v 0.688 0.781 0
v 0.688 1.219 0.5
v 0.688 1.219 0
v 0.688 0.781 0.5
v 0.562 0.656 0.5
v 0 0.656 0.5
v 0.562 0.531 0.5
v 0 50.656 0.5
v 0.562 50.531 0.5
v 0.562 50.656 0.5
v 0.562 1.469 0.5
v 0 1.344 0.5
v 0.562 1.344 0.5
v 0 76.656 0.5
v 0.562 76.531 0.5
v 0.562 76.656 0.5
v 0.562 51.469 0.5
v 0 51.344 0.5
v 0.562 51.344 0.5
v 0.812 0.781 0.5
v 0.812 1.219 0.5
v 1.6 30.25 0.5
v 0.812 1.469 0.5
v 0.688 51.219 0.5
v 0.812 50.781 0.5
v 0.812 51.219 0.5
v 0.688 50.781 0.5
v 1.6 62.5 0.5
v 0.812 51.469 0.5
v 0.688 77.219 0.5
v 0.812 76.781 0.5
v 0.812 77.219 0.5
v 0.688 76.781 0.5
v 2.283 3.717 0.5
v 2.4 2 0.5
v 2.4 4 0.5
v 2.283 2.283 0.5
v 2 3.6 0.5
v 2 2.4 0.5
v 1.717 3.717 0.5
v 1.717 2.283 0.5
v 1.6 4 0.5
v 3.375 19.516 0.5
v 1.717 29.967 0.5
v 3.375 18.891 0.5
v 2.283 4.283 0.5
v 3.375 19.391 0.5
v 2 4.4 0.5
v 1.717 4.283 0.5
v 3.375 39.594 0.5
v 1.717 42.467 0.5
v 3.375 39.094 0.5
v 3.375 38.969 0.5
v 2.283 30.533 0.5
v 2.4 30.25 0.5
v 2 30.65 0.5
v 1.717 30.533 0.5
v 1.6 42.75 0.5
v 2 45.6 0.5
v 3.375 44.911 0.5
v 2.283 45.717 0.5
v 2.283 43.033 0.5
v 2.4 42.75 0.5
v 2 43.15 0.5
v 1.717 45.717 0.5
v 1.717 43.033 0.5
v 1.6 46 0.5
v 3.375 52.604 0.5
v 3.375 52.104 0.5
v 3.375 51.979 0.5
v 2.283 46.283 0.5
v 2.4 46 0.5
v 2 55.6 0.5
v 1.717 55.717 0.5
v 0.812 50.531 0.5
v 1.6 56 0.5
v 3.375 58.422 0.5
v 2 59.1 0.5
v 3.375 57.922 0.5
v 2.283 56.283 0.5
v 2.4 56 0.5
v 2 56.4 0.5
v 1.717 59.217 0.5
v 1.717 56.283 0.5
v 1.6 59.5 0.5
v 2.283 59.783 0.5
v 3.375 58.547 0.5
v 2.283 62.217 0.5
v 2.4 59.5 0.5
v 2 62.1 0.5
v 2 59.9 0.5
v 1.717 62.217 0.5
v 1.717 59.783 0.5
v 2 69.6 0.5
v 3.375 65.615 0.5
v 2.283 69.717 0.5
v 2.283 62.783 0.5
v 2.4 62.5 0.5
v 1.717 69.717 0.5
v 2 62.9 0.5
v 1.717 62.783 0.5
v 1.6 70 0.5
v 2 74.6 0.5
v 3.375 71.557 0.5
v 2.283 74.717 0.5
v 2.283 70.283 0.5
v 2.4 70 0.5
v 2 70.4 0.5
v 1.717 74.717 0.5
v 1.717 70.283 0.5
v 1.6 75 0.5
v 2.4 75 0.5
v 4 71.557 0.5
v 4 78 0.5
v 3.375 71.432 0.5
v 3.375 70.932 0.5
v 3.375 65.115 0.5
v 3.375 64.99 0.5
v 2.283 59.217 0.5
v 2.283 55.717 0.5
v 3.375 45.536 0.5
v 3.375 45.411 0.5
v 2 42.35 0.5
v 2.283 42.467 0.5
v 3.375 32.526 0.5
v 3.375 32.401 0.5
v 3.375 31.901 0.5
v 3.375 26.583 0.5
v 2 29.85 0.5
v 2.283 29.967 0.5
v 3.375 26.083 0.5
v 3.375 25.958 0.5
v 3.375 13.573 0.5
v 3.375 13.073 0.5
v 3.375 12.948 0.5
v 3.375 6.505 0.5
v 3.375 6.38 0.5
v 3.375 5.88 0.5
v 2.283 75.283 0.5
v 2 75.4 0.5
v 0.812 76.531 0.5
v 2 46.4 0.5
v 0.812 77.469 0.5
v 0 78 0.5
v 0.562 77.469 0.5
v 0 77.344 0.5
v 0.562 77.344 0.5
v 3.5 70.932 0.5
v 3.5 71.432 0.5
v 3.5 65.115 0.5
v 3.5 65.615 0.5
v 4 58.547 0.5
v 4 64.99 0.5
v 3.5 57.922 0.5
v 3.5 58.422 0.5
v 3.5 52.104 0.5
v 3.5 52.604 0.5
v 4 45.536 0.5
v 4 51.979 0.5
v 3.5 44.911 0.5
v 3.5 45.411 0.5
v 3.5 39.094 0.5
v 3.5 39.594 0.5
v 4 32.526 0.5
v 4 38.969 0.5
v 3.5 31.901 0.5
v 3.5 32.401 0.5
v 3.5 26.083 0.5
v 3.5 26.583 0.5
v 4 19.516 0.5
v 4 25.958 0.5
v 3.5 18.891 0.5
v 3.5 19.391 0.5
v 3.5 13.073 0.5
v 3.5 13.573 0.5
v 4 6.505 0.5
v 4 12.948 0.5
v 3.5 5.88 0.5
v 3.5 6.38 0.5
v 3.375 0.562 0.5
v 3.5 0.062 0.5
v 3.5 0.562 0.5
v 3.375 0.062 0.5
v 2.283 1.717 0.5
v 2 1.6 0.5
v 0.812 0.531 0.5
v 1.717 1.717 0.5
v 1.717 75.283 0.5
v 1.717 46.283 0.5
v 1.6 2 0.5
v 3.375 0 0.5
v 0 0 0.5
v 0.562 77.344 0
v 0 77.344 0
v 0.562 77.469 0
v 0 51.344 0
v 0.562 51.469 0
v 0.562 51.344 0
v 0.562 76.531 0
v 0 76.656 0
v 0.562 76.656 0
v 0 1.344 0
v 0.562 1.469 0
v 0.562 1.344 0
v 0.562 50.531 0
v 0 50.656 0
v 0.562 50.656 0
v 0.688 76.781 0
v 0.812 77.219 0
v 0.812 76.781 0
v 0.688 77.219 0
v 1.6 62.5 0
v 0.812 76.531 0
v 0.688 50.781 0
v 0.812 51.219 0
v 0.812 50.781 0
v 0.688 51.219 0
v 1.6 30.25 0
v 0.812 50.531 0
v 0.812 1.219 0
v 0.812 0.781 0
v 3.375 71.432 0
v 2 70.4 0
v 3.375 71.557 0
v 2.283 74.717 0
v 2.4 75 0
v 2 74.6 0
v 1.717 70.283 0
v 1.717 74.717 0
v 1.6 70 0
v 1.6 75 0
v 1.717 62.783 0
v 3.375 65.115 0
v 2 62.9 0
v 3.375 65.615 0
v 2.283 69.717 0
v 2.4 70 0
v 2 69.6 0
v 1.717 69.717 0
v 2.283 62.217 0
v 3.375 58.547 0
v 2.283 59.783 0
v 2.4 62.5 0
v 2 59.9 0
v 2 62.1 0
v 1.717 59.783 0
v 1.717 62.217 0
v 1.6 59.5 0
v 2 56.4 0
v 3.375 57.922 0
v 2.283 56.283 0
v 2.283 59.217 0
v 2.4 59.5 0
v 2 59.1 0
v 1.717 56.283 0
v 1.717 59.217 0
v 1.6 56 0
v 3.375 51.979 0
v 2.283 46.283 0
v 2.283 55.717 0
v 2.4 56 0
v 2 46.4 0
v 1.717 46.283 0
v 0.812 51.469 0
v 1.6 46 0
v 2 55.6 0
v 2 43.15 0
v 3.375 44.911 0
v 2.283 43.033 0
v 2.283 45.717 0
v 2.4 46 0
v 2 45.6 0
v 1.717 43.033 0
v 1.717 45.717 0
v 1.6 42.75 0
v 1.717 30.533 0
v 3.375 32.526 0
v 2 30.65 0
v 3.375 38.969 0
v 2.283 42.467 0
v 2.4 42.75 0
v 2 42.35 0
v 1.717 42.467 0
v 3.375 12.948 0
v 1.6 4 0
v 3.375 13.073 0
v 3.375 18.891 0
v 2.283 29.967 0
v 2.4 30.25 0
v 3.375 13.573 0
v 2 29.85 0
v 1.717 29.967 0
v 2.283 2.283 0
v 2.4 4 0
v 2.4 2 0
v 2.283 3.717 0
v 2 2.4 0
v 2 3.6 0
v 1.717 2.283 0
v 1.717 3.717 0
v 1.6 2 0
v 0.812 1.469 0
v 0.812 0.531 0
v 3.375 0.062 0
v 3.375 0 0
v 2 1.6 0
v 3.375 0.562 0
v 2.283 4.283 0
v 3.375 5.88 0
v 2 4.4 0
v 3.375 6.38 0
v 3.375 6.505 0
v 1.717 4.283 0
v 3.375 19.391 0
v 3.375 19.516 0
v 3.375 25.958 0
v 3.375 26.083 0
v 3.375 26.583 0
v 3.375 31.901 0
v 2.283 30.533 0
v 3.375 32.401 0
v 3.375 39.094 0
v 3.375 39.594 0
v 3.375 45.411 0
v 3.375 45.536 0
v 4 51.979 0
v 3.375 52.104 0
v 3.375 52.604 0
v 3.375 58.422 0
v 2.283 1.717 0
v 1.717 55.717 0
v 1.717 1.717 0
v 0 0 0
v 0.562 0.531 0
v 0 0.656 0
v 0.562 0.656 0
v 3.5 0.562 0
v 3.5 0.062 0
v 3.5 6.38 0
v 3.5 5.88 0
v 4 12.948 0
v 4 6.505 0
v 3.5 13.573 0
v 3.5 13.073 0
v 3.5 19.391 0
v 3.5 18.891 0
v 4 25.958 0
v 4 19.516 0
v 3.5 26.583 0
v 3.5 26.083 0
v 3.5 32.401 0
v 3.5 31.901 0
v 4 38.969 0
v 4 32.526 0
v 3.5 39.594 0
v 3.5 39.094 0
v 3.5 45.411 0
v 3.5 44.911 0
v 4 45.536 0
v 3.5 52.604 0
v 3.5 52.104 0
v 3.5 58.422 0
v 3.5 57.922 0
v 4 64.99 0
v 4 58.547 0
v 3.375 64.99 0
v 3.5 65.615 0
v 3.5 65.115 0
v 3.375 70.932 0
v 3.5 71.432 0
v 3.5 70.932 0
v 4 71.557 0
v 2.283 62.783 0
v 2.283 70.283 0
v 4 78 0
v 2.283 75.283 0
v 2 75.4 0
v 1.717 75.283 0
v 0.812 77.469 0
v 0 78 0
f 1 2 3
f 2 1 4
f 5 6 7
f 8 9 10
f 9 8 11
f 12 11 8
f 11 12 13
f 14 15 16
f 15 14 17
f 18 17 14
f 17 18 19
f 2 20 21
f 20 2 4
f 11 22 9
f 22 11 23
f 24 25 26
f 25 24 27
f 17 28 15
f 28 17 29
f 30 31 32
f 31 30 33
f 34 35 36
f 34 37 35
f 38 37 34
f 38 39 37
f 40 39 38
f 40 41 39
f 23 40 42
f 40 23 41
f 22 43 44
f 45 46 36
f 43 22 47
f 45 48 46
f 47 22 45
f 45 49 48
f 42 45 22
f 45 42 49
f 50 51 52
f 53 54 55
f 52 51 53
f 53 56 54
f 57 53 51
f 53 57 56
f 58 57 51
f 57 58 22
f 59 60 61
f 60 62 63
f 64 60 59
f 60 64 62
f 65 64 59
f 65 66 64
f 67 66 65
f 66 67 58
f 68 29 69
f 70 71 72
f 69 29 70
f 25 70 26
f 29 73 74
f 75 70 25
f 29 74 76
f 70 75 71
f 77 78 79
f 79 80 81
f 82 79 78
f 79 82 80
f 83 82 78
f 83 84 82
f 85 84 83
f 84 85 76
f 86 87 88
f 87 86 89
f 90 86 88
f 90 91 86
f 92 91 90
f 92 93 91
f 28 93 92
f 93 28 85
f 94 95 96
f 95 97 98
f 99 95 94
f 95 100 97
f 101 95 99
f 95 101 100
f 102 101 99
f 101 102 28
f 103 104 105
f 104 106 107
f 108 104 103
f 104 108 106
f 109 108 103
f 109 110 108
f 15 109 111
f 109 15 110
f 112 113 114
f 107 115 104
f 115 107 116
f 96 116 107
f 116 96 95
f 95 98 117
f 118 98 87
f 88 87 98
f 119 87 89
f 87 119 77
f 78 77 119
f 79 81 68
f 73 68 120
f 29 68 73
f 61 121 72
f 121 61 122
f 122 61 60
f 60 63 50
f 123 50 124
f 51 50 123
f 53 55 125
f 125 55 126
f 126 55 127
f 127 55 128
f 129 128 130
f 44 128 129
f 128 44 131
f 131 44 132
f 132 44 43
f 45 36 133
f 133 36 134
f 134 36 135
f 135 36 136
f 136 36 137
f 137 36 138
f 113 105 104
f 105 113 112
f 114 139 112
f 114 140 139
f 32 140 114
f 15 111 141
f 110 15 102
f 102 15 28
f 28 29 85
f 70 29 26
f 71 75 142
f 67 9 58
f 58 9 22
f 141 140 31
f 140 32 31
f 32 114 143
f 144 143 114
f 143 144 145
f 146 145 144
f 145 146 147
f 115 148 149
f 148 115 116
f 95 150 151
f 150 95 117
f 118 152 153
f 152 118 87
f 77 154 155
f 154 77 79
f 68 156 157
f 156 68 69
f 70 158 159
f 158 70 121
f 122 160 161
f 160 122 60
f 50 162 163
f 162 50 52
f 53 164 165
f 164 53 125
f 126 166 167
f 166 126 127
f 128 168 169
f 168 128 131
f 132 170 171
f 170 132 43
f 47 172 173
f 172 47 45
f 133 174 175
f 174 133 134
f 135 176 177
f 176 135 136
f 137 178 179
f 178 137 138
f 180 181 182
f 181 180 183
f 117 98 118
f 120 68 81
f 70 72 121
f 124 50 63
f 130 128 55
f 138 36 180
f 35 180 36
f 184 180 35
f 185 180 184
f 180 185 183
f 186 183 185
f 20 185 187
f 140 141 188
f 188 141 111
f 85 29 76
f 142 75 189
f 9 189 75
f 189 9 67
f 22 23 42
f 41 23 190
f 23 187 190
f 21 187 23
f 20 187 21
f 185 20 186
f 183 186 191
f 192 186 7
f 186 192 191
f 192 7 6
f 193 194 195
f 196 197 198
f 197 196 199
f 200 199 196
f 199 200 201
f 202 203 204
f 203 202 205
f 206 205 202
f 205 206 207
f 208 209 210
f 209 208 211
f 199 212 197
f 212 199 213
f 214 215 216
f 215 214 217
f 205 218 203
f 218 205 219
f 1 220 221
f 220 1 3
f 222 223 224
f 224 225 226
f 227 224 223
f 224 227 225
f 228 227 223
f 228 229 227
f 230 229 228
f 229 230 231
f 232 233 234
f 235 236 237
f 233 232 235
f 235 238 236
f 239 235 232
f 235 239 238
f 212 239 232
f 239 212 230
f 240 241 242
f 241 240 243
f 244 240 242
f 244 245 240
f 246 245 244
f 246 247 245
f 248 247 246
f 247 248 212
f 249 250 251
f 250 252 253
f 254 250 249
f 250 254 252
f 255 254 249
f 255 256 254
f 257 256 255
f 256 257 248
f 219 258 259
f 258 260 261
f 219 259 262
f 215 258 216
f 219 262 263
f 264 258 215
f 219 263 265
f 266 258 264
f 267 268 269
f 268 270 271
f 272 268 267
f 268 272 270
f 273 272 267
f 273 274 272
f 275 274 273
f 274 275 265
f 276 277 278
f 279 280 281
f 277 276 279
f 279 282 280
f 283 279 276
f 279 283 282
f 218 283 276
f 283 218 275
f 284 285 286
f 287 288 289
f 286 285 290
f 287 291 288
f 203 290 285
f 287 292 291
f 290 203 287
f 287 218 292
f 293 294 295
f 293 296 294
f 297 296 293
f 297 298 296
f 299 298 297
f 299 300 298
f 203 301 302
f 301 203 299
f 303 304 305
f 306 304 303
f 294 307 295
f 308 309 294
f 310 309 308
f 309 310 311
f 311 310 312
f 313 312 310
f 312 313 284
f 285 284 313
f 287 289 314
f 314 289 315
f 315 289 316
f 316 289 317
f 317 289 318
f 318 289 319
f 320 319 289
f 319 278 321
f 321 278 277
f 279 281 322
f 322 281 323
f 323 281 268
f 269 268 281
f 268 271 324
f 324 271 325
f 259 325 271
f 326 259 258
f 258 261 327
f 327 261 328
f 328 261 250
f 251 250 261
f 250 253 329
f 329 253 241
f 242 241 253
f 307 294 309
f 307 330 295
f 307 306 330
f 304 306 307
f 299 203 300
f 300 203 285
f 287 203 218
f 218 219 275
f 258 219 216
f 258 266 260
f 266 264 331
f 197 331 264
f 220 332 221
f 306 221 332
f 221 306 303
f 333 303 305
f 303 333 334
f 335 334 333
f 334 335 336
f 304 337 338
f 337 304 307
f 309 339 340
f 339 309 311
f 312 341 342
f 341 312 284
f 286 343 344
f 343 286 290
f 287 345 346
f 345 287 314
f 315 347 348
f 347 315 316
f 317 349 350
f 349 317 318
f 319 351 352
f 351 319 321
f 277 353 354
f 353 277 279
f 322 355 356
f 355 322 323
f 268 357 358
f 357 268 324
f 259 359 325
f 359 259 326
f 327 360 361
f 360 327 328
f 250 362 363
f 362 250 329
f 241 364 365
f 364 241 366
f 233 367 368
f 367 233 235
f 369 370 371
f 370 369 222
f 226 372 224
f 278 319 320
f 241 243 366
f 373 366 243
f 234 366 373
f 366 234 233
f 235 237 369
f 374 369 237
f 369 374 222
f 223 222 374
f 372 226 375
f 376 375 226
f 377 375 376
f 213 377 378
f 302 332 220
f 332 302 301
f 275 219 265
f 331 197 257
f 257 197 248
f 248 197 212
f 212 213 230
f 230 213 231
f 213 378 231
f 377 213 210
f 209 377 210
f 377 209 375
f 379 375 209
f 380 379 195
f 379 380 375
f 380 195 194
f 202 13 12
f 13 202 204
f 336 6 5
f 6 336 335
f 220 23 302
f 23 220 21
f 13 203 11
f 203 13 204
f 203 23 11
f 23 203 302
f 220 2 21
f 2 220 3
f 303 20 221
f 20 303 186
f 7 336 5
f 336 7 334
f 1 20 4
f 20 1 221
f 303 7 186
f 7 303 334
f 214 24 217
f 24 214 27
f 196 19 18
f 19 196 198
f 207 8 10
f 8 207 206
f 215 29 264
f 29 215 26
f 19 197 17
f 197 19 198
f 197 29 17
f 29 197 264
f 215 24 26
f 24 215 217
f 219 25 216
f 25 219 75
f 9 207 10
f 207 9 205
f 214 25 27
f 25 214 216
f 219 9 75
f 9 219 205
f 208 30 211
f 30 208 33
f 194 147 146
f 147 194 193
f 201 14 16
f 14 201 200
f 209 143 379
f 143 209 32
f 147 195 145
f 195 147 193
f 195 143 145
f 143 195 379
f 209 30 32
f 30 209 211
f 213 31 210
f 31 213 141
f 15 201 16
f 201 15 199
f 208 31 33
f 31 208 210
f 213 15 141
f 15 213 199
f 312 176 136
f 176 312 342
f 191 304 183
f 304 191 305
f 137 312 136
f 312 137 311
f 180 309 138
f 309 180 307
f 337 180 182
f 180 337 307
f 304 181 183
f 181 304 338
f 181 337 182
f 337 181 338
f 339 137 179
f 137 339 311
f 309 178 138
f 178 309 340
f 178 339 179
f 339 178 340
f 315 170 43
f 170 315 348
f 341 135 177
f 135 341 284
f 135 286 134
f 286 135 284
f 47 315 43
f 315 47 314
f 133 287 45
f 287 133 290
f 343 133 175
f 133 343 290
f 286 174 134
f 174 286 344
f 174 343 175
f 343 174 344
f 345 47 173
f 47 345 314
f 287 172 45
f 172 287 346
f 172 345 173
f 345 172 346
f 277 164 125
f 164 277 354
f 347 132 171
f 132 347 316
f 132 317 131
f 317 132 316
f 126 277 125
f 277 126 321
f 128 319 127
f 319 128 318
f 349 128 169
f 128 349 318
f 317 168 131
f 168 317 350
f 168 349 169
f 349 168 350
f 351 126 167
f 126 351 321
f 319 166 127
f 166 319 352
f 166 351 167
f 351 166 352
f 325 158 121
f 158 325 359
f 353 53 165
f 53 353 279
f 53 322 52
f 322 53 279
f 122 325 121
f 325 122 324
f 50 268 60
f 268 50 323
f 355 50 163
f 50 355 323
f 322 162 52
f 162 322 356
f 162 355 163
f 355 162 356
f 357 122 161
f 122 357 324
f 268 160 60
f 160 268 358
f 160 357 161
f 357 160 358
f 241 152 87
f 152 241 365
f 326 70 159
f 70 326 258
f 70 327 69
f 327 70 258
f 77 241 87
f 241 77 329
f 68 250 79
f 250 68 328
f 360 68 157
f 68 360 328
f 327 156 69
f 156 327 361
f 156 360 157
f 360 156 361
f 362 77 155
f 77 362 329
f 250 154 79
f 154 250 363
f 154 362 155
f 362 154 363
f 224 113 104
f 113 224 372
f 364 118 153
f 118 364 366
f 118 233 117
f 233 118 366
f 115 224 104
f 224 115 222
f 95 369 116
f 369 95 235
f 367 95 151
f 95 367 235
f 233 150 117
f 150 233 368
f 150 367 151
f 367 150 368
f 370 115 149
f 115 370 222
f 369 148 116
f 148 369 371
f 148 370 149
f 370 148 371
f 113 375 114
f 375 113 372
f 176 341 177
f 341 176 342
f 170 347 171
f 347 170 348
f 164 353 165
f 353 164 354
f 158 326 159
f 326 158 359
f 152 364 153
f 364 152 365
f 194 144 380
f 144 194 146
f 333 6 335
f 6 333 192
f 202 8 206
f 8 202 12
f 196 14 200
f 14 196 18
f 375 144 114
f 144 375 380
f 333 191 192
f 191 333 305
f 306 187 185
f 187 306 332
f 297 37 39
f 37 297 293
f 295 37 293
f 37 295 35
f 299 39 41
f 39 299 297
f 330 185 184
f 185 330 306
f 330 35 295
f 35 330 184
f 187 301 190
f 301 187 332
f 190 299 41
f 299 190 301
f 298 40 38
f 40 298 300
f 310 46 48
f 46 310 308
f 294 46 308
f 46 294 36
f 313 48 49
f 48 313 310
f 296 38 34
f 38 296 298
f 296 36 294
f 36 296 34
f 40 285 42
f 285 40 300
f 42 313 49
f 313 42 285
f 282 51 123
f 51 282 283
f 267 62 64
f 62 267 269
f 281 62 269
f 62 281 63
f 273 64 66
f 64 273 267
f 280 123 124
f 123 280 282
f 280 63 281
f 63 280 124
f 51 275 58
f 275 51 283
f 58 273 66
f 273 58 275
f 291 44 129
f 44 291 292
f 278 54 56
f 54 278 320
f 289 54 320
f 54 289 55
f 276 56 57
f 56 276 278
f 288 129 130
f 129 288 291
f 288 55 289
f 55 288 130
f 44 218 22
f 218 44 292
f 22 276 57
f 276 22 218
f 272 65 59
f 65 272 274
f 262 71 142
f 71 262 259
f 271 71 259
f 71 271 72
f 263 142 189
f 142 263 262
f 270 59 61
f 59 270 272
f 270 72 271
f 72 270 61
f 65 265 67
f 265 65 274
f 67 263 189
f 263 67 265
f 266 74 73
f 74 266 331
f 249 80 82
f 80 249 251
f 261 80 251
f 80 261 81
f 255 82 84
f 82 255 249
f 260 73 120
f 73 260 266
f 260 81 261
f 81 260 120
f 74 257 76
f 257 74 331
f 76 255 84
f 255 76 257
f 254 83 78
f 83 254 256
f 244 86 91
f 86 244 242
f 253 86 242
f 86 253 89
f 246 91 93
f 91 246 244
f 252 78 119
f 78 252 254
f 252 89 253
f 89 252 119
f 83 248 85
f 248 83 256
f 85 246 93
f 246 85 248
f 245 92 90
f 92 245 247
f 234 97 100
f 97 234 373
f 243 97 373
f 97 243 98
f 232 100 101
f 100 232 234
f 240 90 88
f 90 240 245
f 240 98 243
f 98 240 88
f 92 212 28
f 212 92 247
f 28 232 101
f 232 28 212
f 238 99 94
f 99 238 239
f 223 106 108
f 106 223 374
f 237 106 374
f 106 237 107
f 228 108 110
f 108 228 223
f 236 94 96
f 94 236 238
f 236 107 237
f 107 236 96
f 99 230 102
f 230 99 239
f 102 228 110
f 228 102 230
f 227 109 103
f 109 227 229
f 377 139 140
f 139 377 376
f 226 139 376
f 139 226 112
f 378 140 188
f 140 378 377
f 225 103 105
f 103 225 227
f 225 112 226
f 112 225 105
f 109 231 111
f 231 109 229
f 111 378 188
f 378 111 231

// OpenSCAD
// file: modus.scad
//Corner Joint - allows the sides of two parts to create inlayed corner. Aids with welding.
//need to verify module math is the same throughout all parts.

module cornerjoint(Z,L,H,EndGap,PadL,PadH,CJangle,CJcenter){
    //change so that H = Z of inlayed part (usually 0.5)
    //add center and angle in degrees option, orgin far side of cut out area

     if((CJangle==0)&&(CJcenter==0))
      {    
        translate([0,0,0])
        rotate([0,0,CJangle])
        difference(){
        cube([L,H+PadH,Z]);
        translate([EndGap,H,0])
        cube([PadL,PadH,Z]);
        translate([L-EndGap-PadL,H,0])
        cube([PadL,PadH,Z]);}
      }    
else if((CJangle==90)&&(CJcenter==0))
      {    
        translate([H+PadH,0,0])
        rotate([0,0,CJangle])
        difference(){
        cube([L,H+PadH,Z]);
        translate([EndGap,H,0])
        cube([PadL,PadH,Z]);
        translate([L-EndGap-PadL,H,0])
        cube([PadL,PadH,Z]);}
      }
else if((CJangle==180)&&(CJcenter==0))       
      {    
        translate([L,H+PadH,0])
        rotate([0,0,CJangle])
        difference(){
        cube([L,H+PadH,Z]);
        translate([EndGap,H,0])
        cube([PadL,PadH,Z]);
        translate([L-EndGap-PadL,H,0])
        cube([PadL,PadH,Z]);}
      }
else if((CJangle==270)&&(CJcenter==0))
      {    
        translate([0,L,0])
        rotate([0,0,CJangle])
        difference(){
        cube([L,H+PadH,Z]);
        translate([EndGap,H,0])
        cube([PadL,PadH,Z]);
        translate([L-EndGap-PadL,H,0])
        cube([PadL,PadH,Z]);}
      }  
      
//centered     
   
else if((CJangle==0)&&(CJcenter==1))
      {    
        translate([-L/2,0,0])
        rotate([0,0,CJangle])
        difference(){
        cube([L,H+PadH,Z]);
        translate([EndGap,H,0])
        cube([PadL,PadH,Z]);
        translate([L-EndGap-PadL,H,0])
        cube([PadL,PadH,Z]);}
      }  
else if((CJangle==90)&&(CJcenter==1))
      {    
        translate([0,-L/2,0])
        rotate([0,0,CJangle])
        difference(){
        cube([L,H+PadH,Z]);
        translate([EndGap,H,0])
        cube([PadL,PadH,Z]);
        translate([L-EndGap-PadL,H,0])
        cube([PadL,PadH,Z]);}
      }
else if((CJangle==180)&&(CJcenter==1))       
      {    
        translate([L/2,0,0])
        rotate([0,0,CJangle])
        difference(){
        cube([L,H+PadH,Z]);
        translate([EndGap,H,0])
        cube([PadL,PadH,Z]);
        translate([L-EndGap-PadL,H,0])
        cube([PadL,PadH,Z]);}
      }
else if((CJangle==270)&&(CJcenter==1))
      {    
        translate([0,L/2,0])
        rotate([0,0,CJangle])
        difference(){
        cube([L,H+PadH,Z]);
        translate([EndGap,H,0])
        cube([PadL,PadH,Z]);
        translate([L-EndGap-PadL,H,0])
        cube([PadL,PadH,Z]);}
      }
} //end cornerjoint module

//Tab Insert - used to cut a hole for an abutting part to insert into. Typically aids with welding the two parts.
module tabinsert(X,Y,Z,dGap,cGap,c1,c2,c3,c4,c5,c6,c7,c8,center){
    translate([-dGap-(center*(X/2)),-dGap-(center*(Y/2)),0]){
        //main cut
        cube([X+(dGap*2),Y+(dGap*2),Z]);
        //corner c1c2
        translate([-cGap,(Y+(dGap*2))-c1+cGap,0])
            {
        cube([c2,c1,Z]);}
       //corner c3c4
       translate([(X+(dGap*2))-c3+cGap,(Y+(dGap*2))-c4+cGap,0]){
           cube([c3,c4,Z]);
       }
       //corner c5c6
       translate([(X+(dGap*2))-c6+cGap,-cGap,0])
      {
          cube([c6,c5,Z]);
      }
       
       //corner c7c8 
       translate([-cGap,-cGap,0]){
           cube([c7,c8,Z]);
       }
    
    } //end center translate
} //end tabinsert module
 

module nut(flattoflat,nutheight){  //distance from one flat side to the other flat side "A/F"

//typical sizes found here:
//https://en.wikipedia.org/wiki/Nut_(hardware)

difference(){
    translate([0,0,nutheight/2])
cube(size = [10,10,nutheight], center = true);
    
for(i=[1:6]){
    rotate([0,0,i*60])
difference(){
    translate([-10,0,0])
    cube([20,20,nutheight]);
    translate([-10,0,0])
    cube([20,flattoflat/2,nutheight]);
}  //end difference
}  //end for
}  //end differeence
}  //end module
// file: vars.scad
brickW=6; 
brickL=24;
brickCH=6; //Is brick height being shortened by d1z??

//3.625 x 2.25 x 8
//6 x 12 x 6

grateX=56;
grateY=23;
grateH=37; //Height mounted above press's frame
grateA=17.5; //angle of grate

//grateX=56;
//grateY=23;
//grateH=37; //Height mounted above press's frame
//grateA=17.5; //angle of grate


$fn=8; //defines resolution of circles. 8 is okay for review. 100  or greater should be used for for final dxf export.

dZstandard=0.5; //thickness of steel to be cut for drawer parts
fZstandard=0.5;
aZstandard=0.5; //thickness of steel to be cut for arm parts
hZstandard=0.125;

fBOLTHOLEstandardD=1; //standard bolts used on frame
aBOLTHOLEstandardD=1;

sliderodholeOD=1.2; 
d1bushingOD=1.25;
d1bushingL=1.25;
d1shaftOD=1;
d1bolt1OD=1;
d1bolt2OD=0.75;
d1nut2AF=1.25;
d1nut2H=0.665;


dGap=0.03125; //gap between a hole cut's edge and the part sitting within the hole. //D3 appears to use 0.3125, is this in error?

//all parts set to standard thickness below
//off standard preferences can be defined below

//drawer
drawergap=0.0283;  //extra room for drawer to slide in the space between f1 and f4
drawerHgap=0.1884;  //total extra space from drawer sides to frame walls. sum of both sides.

d2clevispinaccessholeOD=3;

d1z=dZstandard;
d2z=dZstandard;
d3z=dZstandard;
d4z=dZstandard;
d5z=dZstandard;
d6z=dZstandard;
d5z=dZstandard;
d7z=dZstandard;
d8z=dZstandard;
d9z=dZstandard;

d11z=dZstandard;
d12z=dZstandard;


//frame

f1y=6;
f1z=fZstandard;


f2y=3.5;
f2z=fZstandard;

f3y=3.5;
f3z=fZstandard;

f4y=11;
f4z=fZstandard;

f5y=3.5;
f5z=fZstandard;

f6y=8;
f6z=fZstandard;

f8y=brickW;
f8z=fZstandard;
f8boltD=1;

f9y=4.5;

f9z=fZstandard;




f12z=fZstandard;   

f11x=1.25;
f11z=fZstandard;

f13z=fZstandard;

f14y=3.5;
f14z=fZstandard;

//arms

a1x=4;
a1z=aZstandard;
a1out=24; //length from frame to A5 edge for bricks to sit on as they exit

a2x=6;
a2z=aZstandard;

a3x=4;
a3y=72;
a3z=aZstandard;

a4x=6;
a4y=72;
a4z=aZstandard;

a5x=6;
a5y=72;
a5z=aZstandard;

a6z=aZstandard;

//guards

h1x=grateX;
h1y=grateH;  //might need to tweak for grate thickness

h1z=hZstandard;
h2z=hZstandard;
h3z=hZstandard;
h4z=hZstandard;
h5z=hZstandard;
h6z=hZstandard;
h7z=hZstandard;
h8z=hZstandard;

//
//Input your main cylinder's dimenions here
//
cylMainBore = 5;
cylMainStroke = 16;
cylMainExt = 43;
cylMainRet = 27;
cylMainA = (cylMainRet-cylMainStroke); //center to center minus stroke length
cylMainB = 0.25; // cylinder wall thickness
cylMainD = 2.5; //Rod OD
cylMainE = 5.75; //rear pin holder width
cylMainG = 4; //rod pin holder width
cylMainJ = 3.8; //distance from the end of the cylinder body to rod pin center
cylMainR = 1.52; //pin hole ID
cylMainS = 2.5; //pin holder OD

//
//Input your drawer cylinder's dimenions here
//
//
cylDrawerBore = 5;
cylDrawerStroke = 16;
cylDrawerExt = 43;
cylDrawerRet = 27;
cylDrawerA = (cylMainRet-cylMainStroke); //center to center minus stroke length
cylDrawerB = 0.25; // cylinder wall thickness
cylDrawerD = 2.5; //Rod OD
cylDrawerE = 5.75; //rear pin holder width
cylDrawerG = 4; //rod pin holder width
cylDrawerJ = 3.8; //distance from the end of the cylinder body to rod pin center
cylDrawerR = 1.52; //pin hole ID
cylDrawerS = 2.5; //pin holder OD

cylinderDRAWERbodyH=3; //measured when in position, largest length from top to bottom of cylinder
cylinderDRAWERminC2C=0; //drawer's hydraulic cylinder's distance from the center of one mounting hole to the center of the other when fully compressed.
cylinderDRAWERmaxC2C=0; ///drawer's hydraulic cylinder's distance from the center of one mounting hole to the center of the other when fully extended.
cylinderDRAWERrodclevisW=2.5; //width of cylinders' clevis on end of rod
cylinderDRAWERrodclevisID=1;
cylinderDRAWERrodclevisOD=2;
cylinderDRAWERrearclevisW=2.5; //width of mounting clevis cylinder body
cylinderDRAWERrearclevisID=1;
cylinderDRAWERrearclevisOD=2;
cylinderDRAWERrearclevisClearance=3; //usable space around rear clevis pin (in diameter). be aware of hyraulic fittings.

//the following variables are calculated in order of dependence on preceding variables

d3x=brickL+(d2z*2);
d3y=brickCH-d1z;
d4x=brickW+d3z+d3z;
d4y=brickCH-d1z;
d5x=brickL+(d2z*2);
d5y=brickW;
d6x=brickL+(d2z*2);
d6y=brickCH;
d7x=cylinderDRAWERrearclevisClearance;
d7y=a4z+d8z+cylinderDRAWERbodyH;
d9x=cylinderDRAWERbodyH+d6z; //should be based on clevis size?
d9y=cylinderDRAWERbodyH+d8z;
d8x=brickL+(d2z*2);
d8y=max(5,(d9x-d6z));   //need to review fundamentals, 5 minimun unless d9 gets larger than d8
d11x=1.5+(d1bolt1OD*2)+d1bushingOD;
d11y=max((0.5+d1bushingL),4);

d12x=d8x;
d12y=d11y+1;

f1x=((brickL+(d2z*2)+drawerHgap+(f9y*2)));
f3x=f1x;

d1x=(brickL+d2z+d2z);
//d1x=(((f1x/2)-(((brickL+(d2z*2)+drawerHgap)/2)-fZstandard-(sliderodholeOD/2)))+(d11x/2))*2;
d1y=((brickW+d3z+d3z)*3)+1;

d2x=d8y+d6z+brickW+d3z+d5y+d3z;
d2y=brickCH;



f11y=f8y;
f6x=brickL+(d2z*2)+(f9y*2)+drawerHgap;

f9x=(f2z+((cylMainS+0.125)/2)+cylMainRet-cylMainJ+1+f4y+drawergap+d2y+f1y);  //leaves 1" between top of cylinder and bottom of F4
f8x=f9x;


f2x=brickL+(d2z*2)+drawerHgap+(f9y*2)-(1.4*2);  //distance between large cut outs in f9

f5x=brickL+(d2z*2)+drawerHgap+(f9y*2)+(a1x*2); //distance between outer edges of each A1

f4x=f5x-0.5;   //same as f5 but minus 0.25 on each side to give a little overhang

f14x=brickL+(1*2)+(.125*2)+(dGap*2); 

f12x=f3x;
f12y=(f3y*2)+brickW;

sliderodoffset=(((brickL+(d2z*2)+drawerHgap)/2)-fZstandard-(sliderodholeOD/2));

distancetof8center=(cylDrawerExt+(a4x/2)+((d9x-d6z)/2)+d6z+(brickW/2)); //F8 center on A1

a1y=distancetof8center+(brickW/2)+a1out;
a2y=a1y;

h7x=f5x-((a1x/2)*2)+(1.5*2);
h7y=cylDrawerStroke;

h8x=f5x-((a1x/2)*2)+(1.5*2);
h8y=a1out-a5x-f5y;  //distance between a5 and f5

hopperBaseX=brickL;
hopperBaseY=brickW;

h2x=grateX;
h2y=sqrt(((h1y-(sin(grateA)*grateY))*(h1y-(sin(grateA)*grateY)))+(((cos(grateA)*grateY)-hopperBaseY)*((cos(grateA)*grateY)-hopperBaseY)));

//h1y-(sin(grateA)*grateY)
//(cos(grateA)*grateY)-hopperBaseY

echo(h1y-(sin(grateA)*grateY));
echo((cos(grateA)*grateY)-hopperBaseY);
echo(h2y);
echo(atan((h1y-(sin(grateA)*grateY))/((cos(grateA)*grateY)-hopperBaseY)));
echo((h1y-(sin(grateA)*grateY))/(h1y));

// ECHO - REQUIRED PARTS BASED ON INPUTS

echo(str("Minimum drawer cylinder stroke length: ",(d3z*2)+d5y+brickW));
//would be cool to validate and confirm user inputed stroke length. set error=1; if drawer cylinder is not long enough. print an echo warning.

echo(str("Grate hieght above ground level: ",(1)));
// main file
include <vars.scad>;
use <modus.scad>;

a1p();

module a1p(){

difference(){
    cube([a1x,a1y,a1z]);
    
    translate([(0.625/2),1,0])
    tabinsert(0.625,a6z+(dGap*2),a1z,0.0625,0.125,0,0,0.25,0.25,0.25,0.25,0,0,1);
    
    translate([(0.625/2),distancetof8center,0])  // center in middle F8
    tabinsert(0.625,a6z+(dGap*2),a1z,0.0625,0.125,0,0,0.25,0.25,0.25,0.25,0,0,1);
    
    translate([(0.625/2),a1y-1,0])
    tabinsert(0.625,a6z+(dGap*2),a1z,0.0625,0.125,0,0,0.25,0.25,0.25,0.25,0,0,1);
    
    translate([a1x/2,(a4x/2)-1,0])
    cylinder(h = a1z, r = 0.4);   // could create a variable for this bolt size
    translate([a1x/2,(a4x/2)+1,0])
    cylinder(h = a1z, r = 0.4);   
   
    //H7
       translate([a1x/2,distancetof8center-(brickW/2)-f5y-(1.75),0])
    cylinder(h = a1z, r = 0.4); 
    
    //H7
       translate([a1x/2,distancetof8center-(brickW/2)-f5y-(h7y-1.75),0])
    cylinder(h = a1z, r = 0.4);
   
    //F5
       translate([a1x/2,distancetof8center-(brickW/2)-(f5y-1.5),0])
    cylinder(h = a1z, r = 0.4);

    //F5
       translate([a1x/2,distancetof8center+(brickW/2)+(f5y-1.5),0])
    cylinder(h = a1z, r = 0.4);
    
    //H8
       translate([a1x/2,distancetof8center+(brickW/2)+f5y+(2),0])
    cylinder(h = a1z, r = 0.4); 
    
    //H8
       translate([a1x/2,distancetof8center+(brickW/2)+f5y+(5),0])
    cylinder(h = a1z, r = 0.4); 
    
    //H8
       translate([a1x/2,distancetof8center+(brickW/2)+f5y+(h8y-2),0])
    cylinder(h = a1z, r = 0.4);
    
    //A5
        translate([a1x/2,a1y-(a5x/2),0])
    cylinder(h = a1z, r = 0.4);
    
    //corner joints
    cjtablength=((a1y-(0.125*5.5))/12);
    cjinsertlength=cjtablength+0.125; 
    for(i=[0:5])
    translate([a1x+0.00001,(i*(cjtablength+cjinsertlength))+(cjinsertlength/2)-(0.125/2),0])
    rotate([0,0,90])
    cornerjoint(a1z,cjinsertlength,a2z,0.125,0.5,0.125,0,1);
    



    } //end difference
    
}  //end a1p module
